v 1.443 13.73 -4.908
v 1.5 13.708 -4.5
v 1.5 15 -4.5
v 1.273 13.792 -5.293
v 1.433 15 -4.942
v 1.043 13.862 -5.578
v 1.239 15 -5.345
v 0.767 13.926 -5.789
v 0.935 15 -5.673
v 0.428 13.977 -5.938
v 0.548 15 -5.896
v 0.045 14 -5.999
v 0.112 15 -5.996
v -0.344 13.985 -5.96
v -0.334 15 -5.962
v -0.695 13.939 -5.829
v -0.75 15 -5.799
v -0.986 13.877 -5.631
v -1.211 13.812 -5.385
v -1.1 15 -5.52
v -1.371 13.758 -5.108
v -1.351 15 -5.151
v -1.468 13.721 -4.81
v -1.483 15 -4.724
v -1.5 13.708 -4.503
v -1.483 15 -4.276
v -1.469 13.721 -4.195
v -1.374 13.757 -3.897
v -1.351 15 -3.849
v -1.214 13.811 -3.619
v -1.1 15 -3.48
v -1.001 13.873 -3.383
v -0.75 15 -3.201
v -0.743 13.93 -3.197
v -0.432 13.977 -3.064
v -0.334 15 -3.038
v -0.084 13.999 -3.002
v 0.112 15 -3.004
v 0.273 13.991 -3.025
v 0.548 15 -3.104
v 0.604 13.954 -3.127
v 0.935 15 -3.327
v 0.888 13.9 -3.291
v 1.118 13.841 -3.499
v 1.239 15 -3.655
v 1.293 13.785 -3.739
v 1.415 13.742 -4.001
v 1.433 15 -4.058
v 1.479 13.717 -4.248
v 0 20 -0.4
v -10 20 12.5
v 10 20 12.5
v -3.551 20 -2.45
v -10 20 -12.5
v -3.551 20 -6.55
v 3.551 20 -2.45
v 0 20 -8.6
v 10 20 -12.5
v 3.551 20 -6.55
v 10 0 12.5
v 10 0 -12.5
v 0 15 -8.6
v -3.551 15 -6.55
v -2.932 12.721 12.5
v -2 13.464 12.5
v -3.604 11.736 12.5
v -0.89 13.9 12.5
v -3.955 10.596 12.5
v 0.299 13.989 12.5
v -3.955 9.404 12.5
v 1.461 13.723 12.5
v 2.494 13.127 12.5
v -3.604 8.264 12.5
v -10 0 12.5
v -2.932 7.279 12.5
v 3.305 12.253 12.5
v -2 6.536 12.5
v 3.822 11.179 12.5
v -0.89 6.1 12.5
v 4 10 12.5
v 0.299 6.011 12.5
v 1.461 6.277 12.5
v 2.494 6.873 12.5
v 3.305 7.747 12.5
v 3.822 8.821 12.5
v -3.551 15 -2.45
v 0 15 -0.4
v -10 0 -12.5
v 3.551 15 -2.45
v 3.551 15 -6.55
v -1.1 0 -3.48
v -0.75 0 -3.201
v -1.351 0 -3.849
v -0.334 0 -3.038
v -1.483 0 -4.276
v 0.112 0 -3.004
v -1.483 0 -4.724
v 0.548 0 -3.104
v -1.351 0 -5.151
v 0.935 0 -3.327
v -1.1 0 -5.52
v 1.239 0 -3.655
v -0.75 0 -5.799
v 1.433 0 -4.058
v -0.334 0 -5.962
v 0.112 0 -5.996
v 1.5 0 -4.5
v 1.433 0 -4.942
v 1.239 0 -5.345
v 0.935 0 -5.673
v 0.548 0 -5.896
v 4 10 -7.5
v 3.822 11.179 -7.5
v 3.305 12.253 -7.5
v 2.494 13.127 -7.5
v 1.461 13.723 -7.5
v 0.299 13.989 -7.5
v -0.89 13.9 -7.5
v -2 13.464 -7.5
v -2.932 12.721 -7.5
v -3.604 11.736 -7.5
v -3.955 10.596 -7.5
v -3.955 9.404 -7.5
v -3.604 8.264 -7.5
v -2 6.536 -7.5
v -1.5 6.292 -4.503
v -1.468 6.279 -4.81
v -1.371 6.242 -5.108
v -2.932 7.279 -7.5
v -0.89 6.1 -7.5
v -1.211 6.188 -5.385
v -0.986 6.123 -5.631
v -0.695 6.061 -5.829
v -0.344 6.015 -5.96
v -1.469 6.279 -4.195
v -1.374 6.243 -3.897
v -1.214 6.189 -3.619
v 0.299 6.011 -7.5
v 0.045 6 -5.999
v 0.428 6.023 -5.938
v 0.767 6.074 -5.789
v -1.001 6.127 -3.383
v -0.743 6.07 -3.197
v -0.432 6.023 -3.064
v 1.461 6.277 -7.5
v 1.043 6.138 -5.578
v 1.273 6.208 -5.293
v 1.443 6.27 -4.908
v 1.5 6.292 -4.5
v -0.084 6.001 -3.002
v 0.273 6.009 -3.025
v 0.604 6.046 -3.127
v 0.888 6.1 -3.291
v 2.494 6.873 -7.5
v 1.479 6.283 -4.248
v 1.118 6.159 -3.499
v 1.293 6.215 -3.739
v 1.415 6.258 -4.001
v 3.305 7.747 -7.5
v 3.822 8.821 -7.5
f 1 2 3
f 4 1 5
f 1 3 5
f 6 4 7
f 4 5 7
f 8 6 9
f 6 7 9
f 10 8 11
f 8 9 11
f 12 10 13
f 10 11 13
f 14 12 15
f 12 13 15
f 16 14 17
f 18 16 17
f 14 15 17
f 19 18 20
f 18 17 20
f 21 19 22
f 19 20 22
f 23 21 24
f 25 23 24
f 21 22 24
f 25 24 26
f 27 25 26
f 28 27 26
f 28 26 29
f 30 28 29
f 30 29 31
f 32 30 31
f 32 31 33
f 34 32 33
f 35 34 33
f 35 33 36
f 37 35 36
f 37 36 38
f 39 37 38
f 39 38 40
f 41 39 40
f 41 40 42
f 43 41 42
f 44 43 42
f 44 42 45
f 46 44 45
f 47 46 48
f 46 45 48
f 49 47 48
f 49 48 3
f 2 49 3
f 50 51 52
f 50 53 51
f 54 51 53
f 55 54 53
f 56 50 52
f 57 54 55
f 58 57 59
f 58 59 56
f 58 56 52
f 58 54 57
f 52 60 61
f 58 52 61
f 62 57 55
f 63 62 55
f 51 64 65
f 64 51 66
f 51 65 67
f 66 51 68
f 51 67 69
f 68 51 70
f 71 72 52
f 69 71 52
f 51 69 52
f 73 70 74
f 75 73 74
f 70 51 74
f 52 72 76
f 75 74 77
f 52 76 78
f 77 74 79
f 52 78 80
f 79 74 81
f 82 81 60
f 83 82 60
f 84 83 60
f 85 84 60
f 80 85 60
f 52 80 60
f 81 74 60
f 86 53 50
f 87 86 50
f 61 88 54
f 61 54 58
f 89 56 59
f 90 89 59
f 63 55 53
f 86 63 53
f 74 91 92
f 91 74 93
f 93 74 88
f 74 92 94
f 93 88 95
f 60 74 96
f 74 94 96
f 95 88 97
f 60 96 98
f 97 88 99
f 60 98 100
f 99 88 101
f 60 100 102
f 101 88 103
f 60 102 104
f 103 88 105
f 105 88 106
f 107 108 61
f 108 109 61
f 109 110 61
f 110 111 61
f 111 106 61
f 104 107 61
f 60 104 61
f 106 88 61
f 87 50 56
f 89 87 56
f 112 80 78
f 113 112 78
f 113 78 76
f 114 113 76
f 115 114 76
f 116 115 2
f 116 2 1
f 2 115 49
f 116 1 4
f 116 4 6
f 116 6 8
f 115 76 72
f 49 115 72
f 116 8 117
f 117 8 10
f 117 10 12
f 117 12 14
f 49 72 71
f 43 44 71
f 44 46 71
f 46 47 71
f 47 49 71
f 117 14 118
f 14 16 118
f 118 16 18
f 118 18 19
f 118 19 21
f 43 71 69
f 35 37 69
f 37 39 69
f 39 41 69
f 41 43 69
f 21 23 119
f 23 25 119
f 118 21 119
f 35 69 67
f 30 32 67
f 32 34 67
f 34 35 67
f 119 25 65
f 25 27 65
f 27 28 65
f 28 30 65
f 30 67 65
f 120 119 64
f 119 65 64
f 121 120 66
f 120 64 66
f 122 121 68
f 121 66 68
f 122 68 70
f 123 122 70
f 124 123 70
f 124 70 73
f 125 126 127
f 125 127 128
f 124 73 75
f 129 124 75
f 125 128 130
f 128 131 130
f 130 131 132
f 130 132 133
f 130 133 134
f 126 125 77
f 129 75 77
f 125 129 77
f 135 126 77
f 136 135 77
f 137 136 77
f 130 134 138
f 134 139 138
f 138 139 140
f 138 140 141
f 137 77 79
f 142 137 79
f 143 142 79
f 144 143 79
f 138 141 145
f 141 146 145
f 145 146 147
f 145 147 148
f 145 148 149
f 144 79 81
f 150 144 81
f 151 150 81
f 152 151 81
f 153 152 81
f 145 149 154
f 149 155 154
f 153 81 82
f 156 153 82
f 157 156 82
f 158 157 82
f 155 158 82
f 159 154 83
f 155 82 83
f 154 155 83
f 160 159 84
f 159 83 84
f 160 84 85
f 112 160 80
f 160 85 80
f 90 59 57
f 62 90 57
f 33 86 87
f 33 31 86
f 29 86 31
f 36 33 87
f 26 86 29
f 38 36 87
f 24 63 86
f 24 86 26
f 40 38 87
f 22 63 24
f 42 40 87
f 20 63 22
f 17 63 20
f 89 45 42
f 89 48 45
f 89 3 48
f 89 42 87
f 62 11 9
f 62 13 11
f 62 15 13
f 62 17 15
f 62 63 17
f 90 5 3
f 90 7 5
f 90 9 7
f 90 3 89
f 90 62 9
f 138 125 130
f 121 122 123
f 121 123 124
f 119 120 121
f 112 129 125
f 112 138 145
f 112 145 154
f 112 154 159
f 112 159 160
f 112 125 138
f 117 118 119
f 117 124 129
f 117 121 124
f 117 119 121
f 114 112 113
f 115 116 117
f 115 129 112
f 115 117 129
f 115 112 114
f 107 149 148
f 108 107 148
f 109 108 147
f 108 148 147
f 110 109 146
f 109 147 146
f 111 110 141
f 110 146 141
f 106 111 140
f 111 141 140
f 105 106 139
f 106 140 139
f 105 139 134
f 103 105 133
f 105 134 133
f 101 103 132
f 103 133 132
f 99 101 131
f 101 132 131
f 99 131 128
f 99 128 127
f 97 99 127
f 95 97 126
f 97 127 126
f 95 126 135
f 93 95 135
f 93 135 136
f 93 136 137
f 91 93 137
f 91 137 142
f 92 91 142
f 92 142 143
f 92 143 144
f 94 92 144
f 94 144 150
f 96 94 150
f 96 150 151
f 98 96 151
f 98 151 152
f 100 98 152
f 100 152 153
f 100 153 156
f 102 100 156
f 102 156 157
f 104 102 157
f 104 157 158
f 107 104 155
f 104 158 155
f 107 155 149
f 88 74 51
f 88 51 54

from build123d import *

# Parameters (mm, degrees)
SKETCH1_W           = 20
SKETCH1_H           = 25
BOSS_EXTRUDE1_DEPTH = 20
SKETCH2_R           = 4
CUT_EXTRUDE1_DEPTH  = 20
SKETCH3_R           = 1.5
CUT_EXTRUDE2_DEPTH  = 21
CUT_EXTRUDE3_DEPTH  = 5


with BuildPart() as part:
    # Sketch1 → Boss-Extrude1 (new body)
    with BuildSketch(Plane(origin=(0, 0, 0), x_dir=(1, 0, 0), z_dir=(0, 1, 0))):
        Rectangle(SKETCH1_W, SKETCH1_H)
    extrude(amount=BOSS_EXTRUDE1_DEPTH)

    # Sketch2 → Cut-Extrude1 (cut)
    with BuildSketch(Plane.XY.offset(12.5)):
        with Locations((0, 10)):
            Circle(SKETCH2_R)
    extrude(amount=-CUT_EXTRUDE1_DEPTH, mode=Mode.SUBTRACT)

    # Sketch3 → Cut-Extrude2 (cut, through all)
    with BuildSketch(Plane(origin=(0, 20, 0), x_dir=(1, 0, 0), z_dir=(0, 1, 0))):
        with Locations((0, 4.5)):
            Circle(SKETCH3_R)
    extrude(amount=-CUT_EXTRUDE2_DEPTH, mode=Mode.SUBTRACT)

    # Sketch4 → Cut-Extrude3 (cut)
    with BuildSketch(Plane(origin=(0, 20, 0), x_dir=(1, 0, 0), z_dir=(0, 1, 0))):
        Polygon((0, 8.6), (-3.550704156, 6.55), (-3.550704156, 2.45), (0, 0.4), (3.550704156, 2.45), (3.550704156, 6.55), align=None)
    extrude(amount=-CUT_EXTRUDE3_DEPTH, mode=Mode.SUBTRACT)


solid = part.part
